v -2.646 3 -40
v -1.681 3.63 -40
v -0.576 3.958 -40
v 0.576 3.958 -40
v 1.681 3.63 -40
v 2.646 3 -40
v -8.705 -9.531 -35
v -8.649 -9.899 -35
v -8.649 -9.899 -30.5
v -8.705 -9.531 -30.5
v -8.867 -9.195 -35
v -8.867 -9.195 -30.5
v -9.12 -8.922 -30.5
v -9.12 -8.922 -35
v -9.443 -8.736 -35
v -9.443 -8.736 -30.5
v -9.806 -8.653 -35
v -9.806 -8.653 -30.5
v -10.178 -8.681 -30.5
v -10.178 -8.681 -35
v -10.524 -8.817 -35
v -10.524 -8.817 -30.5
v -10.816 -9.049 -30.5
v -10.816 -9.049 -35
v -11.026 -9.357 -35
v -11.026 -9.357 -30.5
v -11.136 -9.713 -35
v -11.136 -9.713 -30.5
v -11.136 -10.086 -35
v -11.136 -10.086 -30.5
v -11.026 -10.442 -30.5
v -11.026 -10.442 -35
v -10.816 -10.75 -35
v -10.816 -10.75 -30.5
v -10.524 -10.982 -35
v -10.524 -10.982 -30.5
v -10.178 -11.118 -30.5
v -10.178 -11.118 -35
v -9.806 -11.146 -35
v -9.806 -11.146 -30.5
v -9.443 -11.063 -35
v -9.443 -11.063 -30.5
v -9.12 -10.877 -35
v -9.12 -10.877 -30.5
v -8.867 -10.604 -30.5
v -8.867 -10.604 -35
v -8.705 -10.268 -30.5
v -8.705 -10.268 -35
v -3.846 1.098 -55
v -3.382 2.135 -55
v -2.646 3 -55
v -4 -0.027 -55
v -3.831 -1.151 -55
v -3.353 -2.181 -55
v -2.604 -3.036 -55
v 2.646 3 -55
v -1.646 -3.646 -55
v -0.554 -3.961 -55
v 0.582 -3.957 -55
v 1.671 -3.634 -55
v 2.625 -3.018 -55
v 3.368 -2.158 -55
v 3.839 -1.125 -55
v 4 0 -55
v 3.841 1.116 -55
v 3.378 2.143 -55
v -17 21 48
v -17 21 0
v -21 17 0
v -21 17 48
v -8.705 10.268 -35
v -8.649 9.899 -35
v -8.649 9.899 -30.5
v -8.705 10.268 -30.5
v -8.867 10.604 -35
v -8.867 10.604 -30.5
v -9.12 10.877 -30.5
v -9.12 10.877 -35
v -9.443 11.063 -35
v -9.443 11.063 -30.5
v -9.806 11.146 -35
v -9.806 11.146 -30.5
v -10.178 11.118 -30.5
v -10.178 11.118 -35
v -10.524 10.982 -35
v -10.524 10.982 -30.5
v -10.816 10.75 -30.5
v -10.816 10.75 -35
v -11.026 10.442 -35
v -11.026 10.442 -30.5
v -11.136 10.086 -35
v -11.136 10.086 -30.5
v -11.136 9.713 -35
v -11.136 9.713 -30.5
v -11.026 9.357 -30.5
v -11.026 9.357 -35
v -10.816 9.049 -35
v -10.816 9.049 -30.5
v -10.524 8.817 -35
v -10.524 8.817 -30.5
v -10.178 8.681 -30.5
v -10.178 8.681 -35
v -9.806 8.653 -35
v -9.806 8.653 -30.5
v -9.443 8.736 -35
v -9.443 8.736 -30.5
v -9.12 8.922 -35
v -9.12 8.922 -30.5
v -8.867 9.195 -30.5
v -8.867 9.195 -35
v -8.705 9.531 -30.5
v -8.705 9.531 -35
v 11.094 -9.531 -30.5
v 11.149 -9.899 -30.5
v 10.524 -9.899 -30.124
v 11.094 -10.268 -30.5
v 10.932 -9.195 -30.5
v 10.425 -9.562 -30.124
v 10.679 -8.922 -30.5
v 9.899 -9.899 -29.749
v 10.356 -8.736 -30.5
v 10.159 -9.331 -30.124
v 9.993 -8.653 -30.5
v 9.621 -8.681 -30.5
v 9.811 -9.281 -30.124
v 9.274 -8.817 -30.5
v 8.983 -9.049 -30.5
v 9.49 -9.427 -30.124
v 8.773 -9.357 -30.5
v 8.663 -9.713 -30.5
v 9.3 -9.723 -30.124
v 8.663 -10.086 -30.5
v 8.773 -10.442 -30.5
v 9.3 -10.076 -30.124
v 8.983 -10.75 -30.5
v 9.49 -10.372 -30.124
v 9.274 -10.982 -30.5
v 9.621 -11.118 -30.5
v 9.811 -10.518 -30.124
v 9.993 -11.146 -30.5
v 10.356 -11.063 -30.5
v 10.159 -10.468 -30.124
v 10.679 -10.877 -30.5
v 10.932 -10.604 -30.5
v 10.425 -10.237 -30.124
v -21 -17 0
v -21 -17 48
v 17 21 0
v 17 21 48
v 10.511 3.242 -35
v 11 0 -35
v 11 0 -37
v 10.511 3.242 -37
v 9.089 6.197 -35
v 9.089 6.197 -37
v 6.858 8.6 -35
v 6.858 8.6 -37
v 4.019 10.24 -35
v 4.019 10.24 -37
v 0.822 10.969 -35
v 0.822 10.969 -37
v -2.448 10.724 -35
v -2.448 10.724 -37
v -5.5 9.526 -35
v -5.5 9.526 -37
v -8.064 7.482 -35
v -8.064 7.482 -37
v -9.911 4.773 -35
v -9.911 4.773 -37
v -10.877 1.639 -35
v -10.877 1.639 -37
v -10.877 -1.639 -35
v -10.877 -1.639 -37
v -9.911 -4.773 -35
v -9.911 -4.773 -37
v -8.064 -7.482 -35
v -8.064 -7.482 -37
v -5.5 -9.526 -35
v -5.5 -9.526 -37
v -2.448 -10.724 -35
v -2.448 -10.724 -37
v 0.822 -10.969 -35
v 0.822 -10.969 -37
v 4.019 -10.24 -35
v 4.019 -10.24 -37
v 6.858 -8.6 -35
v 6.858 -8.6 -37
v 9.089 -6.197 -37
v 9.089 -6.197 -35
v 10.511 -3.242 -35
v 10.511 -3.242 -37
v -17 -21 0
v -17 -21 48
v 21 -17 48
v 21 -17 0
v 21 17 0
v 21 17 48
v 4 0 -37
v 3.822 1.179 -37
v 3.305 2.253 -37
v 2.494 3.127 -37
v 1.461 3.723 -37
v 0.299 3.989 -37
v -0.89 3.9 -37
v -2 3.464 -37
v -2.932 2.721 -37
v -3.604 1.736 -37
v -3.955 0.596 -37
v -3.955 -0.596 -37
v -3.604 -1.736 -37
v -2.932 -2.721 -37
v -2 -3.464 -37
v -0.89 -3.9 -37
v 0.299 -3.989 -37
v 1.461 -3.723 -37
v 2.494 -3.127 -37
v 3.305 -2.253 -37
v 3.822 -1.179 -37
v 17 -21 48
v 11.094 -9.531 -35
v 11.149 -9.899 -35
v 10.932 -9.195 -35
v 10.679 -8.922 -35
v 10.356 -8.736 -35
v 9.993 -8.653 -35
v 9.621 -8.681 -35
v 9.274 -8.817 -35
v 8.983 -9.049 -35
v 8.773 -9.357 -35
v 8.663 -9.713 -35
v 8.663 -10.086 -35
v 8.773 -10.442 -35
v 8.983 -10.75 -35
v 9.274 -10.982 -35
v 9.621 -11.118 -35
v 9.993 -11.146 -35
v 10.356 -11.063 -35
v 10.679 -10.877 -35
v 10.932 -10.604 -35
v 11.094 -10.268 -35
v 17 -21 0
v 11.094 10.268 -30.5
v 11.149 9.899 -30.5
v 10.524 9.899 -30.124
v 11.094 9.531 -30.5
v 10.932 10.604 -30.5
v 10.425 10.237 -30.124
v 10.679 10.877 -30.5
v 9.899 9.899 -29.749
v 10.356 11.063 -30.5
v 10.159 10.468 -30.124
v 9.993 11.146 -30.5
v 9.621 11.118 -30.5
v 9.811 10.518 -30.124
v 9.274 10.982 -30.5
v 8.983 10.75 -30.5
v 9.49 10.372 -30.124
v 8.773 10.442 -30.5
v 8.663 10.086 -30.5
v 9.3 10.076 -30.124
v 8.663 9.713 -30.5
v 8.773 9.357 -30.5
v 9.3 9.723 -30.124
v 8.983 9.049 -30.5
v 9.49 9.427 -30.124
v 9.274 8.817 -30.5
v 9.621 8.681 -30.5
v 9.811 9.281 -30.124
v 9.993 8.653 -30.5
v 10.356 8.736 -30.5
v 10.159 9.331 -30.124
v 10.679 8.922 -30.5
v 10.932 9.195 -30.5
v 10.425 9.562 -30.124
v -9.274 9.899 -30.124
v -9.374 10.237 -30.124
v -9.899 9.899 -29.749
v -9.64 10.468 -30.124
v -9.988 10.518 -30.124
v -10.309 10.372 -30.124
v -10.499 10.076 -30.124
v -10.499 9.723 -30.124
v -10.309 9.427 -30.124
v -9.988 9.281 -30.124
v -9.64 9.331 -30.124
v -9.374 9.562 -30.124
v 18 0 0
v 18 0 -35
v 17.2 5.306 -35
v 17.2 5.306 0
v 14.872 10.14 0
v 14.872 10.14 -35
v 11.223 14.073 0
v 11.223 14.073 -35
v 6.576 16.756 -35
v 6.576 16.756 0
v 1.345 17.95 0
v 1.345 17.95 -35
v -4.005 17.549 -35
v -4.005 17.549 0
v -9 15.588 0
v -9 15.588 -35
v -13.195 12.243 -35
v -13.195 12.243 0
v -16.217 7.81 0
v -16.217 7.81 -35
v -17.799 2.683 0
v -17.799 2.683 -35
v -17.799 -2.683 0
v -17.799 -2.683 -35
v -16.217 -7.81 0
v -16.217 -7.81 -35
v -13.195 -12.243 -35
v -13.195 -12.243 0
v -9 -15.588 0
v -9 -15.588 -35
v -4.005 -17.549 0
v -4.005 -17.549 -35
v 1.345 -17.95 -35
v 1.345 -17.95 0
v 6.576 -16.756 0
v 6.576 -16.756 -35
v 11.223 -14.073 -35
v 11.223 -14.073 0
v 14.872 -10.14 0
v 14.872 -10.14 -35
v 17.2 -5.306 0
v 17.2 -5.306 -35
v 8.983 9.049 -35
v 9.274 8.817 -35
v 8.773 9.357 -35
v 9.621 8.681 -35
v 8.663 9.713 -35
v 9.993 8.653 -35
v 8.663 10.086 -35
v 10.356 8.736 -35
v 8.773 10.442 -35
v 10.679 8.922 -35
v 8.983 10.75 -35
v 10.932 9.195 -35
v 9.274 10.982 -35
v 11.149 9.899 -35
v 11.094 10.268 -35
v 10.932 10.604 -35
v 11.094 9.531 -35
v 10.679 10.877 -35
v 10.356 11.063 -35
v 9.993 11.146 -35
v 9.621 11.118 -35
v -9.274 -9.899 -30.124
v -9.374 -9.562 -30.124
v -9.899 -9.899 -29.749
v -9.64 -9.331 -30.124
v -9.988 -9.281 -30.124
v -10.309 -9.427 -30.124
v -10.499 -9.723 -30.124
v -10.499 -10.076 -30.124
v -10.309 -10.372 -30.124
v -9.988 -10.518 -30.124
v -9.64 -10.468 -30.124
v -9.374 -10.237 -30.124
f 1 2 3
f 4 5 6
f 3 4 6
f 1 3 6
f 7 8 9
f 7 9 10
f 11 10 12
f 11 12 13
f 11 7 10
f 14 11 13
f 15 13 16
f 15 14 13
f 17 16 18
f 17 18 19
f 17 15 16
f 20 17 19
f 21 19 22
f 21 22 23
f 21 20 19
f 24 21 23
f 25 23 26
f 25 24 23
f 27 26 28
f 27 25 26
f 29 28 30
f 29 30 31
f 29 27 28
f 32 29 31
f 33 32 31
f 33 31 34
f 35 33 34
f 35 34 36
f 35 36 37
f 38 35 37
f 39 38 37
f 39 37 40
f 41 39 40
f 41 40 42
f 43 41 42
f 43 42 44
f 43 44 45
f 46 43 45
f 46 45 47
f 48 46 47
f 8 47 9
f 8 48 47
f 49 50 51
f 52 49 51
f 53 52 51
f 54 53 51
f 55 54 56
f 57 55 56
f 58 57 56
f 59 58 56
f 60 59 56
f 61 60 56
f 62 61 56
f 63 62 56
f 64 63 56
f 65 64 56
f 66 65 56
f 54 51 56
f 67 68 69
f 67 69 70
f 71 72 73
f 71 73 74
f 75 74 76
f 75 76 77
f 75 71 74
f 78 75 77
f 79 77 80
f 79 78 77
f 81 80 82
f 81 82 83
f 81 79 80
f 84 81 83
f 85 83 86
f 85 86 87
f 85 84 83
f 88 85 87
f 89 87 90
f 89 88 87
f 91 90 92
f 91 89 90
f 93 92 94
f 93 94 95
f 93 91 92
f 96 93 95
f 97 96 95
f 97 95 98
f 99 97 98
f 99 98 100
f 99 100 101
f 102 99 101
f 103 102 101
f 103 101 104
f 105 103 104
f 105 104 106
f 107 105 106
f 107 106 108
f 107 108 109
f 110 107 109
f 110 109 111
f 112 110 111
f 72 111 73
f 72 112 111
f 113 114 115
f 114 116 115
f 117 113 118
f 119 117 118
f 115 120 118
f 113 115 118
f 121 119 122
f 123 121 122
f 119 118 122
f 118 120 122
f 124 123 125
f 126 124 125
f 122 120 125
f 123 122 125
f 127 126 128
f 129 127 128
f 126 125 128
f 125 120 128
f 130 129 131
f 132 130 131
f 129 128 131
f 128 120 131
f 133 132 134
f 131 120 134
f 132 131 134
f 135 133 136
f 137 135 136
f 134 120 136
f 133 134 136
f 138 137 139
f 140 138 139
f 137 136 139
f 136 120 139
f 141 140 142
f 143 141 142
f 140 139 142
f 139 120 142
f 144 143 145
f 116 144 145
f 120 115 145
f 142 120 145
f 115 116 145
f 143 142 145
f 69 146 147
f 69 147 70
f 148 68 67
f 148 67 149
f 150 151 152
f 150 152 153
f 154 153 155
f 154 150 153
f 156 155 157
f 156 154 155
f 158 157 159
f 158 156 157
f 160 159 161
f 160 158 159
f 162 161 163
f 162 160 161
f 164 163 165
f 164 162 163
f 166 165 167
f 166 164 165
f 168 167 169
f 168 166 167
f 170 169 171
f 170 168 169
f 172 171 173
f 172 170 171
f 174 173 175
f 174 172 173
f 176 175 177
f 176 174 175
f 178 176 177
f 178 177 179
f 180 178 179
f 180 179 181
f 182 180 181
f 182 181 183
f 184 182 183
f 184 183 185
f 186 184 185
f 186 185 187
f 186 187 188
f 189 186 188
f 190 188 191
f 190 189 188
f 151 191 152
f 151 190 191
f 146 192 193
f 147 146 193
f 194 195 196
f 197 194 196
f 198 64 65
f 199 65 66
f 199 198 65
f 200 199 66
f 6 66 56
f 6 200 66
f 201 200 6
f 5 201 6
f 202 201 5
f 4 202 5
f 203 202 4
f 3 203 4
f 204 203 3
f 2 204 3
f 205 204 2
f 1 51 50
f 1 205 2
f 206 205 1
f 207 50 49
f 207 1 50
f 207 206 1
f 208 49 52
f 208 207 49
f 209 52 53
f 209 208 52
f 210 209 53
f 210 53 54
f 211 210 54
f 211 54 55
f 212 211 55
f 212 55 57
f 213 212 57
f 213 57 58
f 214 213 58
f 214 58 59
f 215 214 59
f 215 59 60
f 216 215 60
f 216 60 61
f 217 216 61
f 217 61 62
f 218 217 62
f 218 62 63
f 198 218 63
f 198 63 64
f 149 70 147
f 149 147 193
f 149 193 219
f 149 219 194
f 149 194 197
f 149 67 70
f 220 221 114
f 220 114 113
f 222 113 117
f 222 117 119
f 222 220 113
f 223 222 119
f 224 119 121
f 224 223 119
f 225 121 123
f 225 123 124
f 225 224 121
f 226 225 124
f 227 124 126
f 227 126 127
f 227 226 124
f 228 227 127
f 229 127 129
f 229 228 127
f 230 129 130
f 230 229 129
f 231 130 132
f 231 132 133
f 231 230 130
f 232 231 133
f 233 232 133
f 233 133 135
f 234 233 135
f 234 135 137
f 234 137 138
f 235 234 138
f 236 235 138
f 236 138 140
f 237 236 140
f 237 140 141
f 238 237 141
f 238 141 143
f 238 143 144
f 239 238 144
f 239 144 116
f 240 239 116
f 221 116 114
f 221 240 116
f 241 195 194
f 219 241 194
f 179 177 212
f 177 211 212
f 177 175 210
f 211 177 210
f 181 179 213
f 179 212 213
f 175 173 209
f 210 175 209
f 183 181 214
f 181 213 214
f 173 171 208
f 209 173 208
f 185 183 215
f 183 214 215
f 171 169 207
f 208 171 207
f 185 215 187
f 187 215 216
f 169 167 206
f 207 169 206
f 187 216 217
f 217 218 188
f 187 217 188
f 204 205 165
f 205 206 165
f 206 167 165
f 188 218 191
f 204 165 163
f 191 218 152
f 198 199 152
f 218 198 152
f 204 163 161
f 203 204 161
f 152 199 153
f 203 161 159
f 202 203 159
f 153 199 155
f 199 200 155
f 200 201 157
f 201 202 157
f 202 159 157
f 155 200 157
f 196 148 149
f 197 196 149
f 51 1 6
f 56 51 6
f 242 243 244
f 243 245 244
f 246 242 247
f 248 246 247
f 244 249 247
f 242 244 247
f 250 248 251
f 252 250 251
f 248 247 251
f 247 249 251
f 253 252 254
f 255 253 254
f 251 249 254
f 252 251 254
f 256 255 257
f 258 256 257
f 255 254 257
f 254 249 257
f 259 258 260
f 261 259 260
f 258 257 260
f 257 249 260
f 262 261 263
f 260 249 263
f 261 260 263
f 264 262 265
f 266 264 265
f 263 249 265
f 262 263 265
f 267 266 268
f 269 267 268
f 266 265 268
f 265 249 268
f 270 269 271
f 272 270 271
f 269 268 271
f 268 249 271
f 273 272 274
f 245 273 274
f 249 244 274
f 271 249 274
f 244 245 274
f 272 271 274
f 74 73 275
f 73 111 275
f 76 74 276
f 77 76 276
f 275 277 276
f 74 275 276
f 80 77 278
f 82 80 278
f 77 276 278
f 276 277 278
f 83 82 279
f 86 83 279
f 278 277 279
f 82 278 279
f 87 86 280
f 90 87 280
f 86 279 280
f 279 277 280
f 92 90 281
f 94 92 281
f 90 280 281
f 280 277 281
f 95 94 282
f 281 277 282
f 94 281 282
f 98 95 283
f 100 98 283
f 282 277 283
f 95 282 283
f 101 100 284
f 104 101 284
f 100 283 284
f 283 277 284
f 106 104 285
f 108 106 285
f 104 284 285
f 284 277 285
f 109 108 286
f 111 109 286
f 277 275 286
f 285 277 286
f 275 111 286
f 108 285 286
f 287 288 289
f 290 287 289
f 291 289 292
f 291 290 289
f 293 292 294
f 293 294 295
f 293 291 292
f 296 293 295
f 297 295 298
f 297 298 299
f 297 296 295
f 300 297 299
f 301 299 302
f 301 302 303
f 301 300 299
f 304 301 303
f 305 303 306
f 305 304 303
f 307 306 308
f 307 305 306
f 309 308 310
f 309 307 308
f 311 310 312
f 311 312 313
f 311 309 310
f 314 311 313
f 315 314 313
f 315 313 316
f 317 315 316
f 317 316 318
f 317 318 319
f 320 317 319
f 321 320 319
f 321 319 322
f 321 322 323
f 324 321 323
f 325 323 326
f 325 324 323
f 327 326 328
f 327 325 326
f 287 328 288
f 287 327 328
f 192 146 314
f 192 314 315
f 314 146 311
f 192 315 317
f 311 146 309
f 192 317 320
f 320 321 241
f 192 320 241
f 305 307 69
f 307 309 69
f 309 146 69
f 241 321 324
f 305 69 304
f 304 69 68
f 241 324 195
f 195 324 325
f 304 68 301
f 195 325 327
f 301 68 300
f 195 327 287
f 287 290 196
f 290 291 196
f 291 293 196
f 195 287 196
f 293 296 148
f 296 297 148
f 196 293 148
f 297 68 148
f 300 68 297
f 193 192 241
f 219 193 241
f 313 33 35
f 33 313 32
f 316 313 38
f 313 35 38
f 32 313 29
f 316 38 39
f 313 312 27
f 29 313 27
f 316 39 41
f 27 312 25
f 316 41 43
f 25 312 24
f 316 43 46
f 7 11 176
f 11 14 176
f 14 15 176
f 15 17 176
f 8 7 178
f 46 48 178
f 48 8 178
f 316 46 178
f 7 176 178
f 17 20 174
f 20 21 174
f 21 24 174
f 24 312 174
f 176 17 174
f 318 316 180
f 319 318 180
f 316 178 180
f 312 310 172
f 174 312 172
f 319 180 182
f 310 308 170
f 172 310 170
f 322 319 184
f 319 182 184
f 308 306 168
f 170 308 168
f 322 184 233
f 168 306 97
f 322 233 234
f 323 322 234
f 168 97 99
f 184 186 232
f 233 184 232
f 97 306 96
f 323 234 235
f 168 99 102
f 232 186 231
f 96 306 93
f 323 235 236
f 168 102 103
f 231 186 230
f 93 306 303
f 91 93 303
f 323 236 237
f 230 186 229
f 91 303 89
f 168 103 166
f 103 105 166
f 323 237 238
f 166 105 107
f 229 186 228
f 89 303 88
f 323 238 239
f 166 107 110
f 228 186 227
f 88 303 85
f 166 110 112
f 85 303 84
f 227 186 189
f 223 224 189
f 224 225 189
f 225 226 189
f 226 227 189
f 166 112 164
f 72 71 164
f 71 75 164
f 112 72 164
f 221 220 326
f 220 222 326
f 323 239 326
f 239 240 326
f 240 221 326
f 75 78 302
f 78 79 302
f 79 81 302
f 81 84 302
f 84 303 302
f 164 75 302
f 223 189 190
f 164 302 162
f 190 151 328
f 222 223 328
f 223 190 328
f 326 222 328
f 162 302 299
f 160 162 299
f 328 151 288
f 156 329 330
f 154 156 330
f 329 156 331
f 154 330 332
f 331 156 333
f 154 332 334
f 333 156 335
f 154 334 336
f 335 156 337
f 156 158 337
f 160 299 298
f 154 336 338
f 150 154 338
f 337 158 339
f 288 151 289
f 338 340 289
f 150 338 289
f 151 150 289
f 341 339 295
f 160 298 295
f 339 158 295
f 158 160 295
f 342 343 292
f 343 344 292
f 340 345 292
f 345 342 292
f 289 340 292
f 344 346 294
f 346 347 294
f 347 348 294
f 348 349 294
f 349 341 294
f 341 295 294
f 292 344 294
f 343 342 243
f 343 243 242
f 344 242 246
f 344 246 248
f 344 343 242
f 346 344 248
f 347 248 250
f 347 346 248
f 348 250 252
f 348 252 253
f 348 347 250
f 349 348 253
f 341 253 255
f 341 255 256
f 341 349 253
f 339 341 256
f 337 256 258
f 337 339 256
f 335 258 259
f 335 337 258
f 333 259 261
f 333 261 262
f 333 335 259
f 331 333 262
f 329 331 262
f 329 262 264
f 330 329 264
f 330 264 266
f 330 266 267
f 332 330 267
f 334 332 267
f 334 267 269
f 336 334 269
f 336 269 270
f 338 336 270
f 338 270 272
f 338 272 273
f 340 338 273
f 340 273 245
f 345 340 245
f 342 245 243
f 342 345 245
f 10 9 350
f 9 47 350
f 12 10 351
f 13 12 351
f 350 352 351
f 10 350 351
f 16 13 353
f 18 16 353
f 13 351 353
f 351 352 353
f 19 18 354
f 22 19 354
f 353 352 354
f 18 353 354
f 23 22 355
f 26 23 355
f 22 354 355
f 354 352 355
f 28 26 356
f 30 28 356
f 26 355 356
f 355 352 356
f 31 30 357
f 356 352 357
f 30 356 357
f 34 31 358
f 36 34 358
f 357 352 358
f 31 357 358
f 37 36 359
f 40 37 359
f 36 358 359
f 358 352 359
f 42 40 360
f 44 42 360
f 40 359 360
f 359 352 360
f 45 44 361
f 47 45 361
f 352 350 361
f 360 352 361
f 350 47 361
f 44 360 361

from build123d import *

# Parameters (mm, degrees)
SKETCH_W     = 42
SKETCH_H     = 42
PAD_DEPTH    = 48
CHAMFER_SIZE = 4
SKETCH005_R  = 18
PAD003_DEPTH = 35
SKETCH001_R  = 11
PAD001_DEPTH = 2
SKETCH002_R  = 4
PAD002_DEPTH = 20
POCKET_DEPTH = 15
SKETCH004_R  = 1.25
HOLE_DEPTH   = 4.5
HOLE_TIPS_R  = 1.25


with BuildPart() as part:
    # Sketch → Pad (new body)
    with BuildSketch(Plane.XY):
        Rectangle(SKETCH_W, SKETCH_H)
    extrude(amount=PAD_DEPTH)

    # Chamfer
    chamfer_edges = [part.edges().sort_by_distance(p)[0] for p in [
        (21, -21, 24),
        (-21, -21, 24),
        (21, 21, 24),
        (-21, 21, 24),
    ]]
    chamfer(chamfer_edges, length=CHAMFER_SIZE)

    # Sketch005 → Pad003 (join)
    with BuildSketch(Plane.XY):
        Circle(SKETCH005_R)
    extrude(amount=-PAD003_DEPTH)

    # Sketch001 → Pad001 (join)
    with BuildSketch(Plane.XY.offset(-35)):
        Circle(SKETCH001_R)
    extrude(amount=-PAD001_DEPTH)

    # Sketch002 (on Sketch) → Pad002 (join)
    with BuildSketch(Plane.XY.offset(-35)):
        Circle(SKETCH002_R)
    extrude(amount=-PAD002_DEPTH)

    # Sketch003 (on Sketch) → Pocket (cut)
    with BuildSketch(Plane.XY.offset(-40)):
        with BuildLine():
            ThreePointArc((10.583005, 3), (0, 11), (-10.583005, 3))
            Line((-10.583005, 3), (10.583005, 3))
        make_face()
    extrude(amount=-POCKET_DEPTH, mode=Mode.SUBTRACT)

    # Sketch004 (on Sketch) → Hole (cut)
    with BuildSketch(Plane.XY.offset(-35)):
        with Locations((9.899495, 9.899495)):
            Circle(SKETCH004_R)
        with Locations((-9.899495, 9.899495)):
            Circle(SKETCH004_R)
        with Locations((-9.899495, -9.899495)):
            Circle(SKETCH004_R)
        with Locations((9.899495, -9.899495)):
            Circle(SKETCH004_R)
    extrude(amount=HOLE_DEPTH, mode=Mode.SUBTRACT)

    # Hole tips → Hole tip 1 section 0
    with BuildSketch(Plane.XY.offset(-30.5), mode=Mode.PRIVATE) as hole_tip_1_s0:
        with Locations((9.899495, 9.899495)):
            Circle(HOLE_TIPS_R)
    loft([hole_tip_1_s0.sketch, Vertex(9.899495, 9.899495, -29.748924)], mode=Mode.SUBTRACT)

    # Hole tips → Hole tip 2 section 0
    with BuildSketch(Plane.XY.offset(-30.5), mode=Mode.PRIVATE) as hole_tip_2_s0:
        with Locations((-9.899495, 9.899495)):
            Circle(HOLE_TIPS_R)
    loft([hole_tip_2_s0.sketch, Vertex(-9.899495, 9.899495, -29.748924)], mode=Mode.SUBTRACT)

    # Hole tips → Hole tip 3 section 0
    with BuildSketch(Plane.XY.offset(-30.5), mode=Mode.PRIVATE) as hole_tip_3_s0:
        with Locations((-9.899495, -9.899495)):
            Circle(HOLE_TIPS_R)
    loft([hole_tip_3_s0.sketch, Vertex(-9.899495, -9.899495, -29.748924)], mode=Mode.SUBTRACT)

    # Hole tips → Hole tip 4 section 0
    with BuildSketch(Plane.XY.offset(-30.5), mode=Mode.PRIVATE) as hole_tip_4_s0:
        with Locations((9.899495, -9.899495)):
            Circle(HOLE_TIPS_R)
    loft([hole_tip_4_s0.sketch, Vertex(9.899495, -9.899495, -29.748924)], mode=Mode.SUBTRACT)


solid = part.part
